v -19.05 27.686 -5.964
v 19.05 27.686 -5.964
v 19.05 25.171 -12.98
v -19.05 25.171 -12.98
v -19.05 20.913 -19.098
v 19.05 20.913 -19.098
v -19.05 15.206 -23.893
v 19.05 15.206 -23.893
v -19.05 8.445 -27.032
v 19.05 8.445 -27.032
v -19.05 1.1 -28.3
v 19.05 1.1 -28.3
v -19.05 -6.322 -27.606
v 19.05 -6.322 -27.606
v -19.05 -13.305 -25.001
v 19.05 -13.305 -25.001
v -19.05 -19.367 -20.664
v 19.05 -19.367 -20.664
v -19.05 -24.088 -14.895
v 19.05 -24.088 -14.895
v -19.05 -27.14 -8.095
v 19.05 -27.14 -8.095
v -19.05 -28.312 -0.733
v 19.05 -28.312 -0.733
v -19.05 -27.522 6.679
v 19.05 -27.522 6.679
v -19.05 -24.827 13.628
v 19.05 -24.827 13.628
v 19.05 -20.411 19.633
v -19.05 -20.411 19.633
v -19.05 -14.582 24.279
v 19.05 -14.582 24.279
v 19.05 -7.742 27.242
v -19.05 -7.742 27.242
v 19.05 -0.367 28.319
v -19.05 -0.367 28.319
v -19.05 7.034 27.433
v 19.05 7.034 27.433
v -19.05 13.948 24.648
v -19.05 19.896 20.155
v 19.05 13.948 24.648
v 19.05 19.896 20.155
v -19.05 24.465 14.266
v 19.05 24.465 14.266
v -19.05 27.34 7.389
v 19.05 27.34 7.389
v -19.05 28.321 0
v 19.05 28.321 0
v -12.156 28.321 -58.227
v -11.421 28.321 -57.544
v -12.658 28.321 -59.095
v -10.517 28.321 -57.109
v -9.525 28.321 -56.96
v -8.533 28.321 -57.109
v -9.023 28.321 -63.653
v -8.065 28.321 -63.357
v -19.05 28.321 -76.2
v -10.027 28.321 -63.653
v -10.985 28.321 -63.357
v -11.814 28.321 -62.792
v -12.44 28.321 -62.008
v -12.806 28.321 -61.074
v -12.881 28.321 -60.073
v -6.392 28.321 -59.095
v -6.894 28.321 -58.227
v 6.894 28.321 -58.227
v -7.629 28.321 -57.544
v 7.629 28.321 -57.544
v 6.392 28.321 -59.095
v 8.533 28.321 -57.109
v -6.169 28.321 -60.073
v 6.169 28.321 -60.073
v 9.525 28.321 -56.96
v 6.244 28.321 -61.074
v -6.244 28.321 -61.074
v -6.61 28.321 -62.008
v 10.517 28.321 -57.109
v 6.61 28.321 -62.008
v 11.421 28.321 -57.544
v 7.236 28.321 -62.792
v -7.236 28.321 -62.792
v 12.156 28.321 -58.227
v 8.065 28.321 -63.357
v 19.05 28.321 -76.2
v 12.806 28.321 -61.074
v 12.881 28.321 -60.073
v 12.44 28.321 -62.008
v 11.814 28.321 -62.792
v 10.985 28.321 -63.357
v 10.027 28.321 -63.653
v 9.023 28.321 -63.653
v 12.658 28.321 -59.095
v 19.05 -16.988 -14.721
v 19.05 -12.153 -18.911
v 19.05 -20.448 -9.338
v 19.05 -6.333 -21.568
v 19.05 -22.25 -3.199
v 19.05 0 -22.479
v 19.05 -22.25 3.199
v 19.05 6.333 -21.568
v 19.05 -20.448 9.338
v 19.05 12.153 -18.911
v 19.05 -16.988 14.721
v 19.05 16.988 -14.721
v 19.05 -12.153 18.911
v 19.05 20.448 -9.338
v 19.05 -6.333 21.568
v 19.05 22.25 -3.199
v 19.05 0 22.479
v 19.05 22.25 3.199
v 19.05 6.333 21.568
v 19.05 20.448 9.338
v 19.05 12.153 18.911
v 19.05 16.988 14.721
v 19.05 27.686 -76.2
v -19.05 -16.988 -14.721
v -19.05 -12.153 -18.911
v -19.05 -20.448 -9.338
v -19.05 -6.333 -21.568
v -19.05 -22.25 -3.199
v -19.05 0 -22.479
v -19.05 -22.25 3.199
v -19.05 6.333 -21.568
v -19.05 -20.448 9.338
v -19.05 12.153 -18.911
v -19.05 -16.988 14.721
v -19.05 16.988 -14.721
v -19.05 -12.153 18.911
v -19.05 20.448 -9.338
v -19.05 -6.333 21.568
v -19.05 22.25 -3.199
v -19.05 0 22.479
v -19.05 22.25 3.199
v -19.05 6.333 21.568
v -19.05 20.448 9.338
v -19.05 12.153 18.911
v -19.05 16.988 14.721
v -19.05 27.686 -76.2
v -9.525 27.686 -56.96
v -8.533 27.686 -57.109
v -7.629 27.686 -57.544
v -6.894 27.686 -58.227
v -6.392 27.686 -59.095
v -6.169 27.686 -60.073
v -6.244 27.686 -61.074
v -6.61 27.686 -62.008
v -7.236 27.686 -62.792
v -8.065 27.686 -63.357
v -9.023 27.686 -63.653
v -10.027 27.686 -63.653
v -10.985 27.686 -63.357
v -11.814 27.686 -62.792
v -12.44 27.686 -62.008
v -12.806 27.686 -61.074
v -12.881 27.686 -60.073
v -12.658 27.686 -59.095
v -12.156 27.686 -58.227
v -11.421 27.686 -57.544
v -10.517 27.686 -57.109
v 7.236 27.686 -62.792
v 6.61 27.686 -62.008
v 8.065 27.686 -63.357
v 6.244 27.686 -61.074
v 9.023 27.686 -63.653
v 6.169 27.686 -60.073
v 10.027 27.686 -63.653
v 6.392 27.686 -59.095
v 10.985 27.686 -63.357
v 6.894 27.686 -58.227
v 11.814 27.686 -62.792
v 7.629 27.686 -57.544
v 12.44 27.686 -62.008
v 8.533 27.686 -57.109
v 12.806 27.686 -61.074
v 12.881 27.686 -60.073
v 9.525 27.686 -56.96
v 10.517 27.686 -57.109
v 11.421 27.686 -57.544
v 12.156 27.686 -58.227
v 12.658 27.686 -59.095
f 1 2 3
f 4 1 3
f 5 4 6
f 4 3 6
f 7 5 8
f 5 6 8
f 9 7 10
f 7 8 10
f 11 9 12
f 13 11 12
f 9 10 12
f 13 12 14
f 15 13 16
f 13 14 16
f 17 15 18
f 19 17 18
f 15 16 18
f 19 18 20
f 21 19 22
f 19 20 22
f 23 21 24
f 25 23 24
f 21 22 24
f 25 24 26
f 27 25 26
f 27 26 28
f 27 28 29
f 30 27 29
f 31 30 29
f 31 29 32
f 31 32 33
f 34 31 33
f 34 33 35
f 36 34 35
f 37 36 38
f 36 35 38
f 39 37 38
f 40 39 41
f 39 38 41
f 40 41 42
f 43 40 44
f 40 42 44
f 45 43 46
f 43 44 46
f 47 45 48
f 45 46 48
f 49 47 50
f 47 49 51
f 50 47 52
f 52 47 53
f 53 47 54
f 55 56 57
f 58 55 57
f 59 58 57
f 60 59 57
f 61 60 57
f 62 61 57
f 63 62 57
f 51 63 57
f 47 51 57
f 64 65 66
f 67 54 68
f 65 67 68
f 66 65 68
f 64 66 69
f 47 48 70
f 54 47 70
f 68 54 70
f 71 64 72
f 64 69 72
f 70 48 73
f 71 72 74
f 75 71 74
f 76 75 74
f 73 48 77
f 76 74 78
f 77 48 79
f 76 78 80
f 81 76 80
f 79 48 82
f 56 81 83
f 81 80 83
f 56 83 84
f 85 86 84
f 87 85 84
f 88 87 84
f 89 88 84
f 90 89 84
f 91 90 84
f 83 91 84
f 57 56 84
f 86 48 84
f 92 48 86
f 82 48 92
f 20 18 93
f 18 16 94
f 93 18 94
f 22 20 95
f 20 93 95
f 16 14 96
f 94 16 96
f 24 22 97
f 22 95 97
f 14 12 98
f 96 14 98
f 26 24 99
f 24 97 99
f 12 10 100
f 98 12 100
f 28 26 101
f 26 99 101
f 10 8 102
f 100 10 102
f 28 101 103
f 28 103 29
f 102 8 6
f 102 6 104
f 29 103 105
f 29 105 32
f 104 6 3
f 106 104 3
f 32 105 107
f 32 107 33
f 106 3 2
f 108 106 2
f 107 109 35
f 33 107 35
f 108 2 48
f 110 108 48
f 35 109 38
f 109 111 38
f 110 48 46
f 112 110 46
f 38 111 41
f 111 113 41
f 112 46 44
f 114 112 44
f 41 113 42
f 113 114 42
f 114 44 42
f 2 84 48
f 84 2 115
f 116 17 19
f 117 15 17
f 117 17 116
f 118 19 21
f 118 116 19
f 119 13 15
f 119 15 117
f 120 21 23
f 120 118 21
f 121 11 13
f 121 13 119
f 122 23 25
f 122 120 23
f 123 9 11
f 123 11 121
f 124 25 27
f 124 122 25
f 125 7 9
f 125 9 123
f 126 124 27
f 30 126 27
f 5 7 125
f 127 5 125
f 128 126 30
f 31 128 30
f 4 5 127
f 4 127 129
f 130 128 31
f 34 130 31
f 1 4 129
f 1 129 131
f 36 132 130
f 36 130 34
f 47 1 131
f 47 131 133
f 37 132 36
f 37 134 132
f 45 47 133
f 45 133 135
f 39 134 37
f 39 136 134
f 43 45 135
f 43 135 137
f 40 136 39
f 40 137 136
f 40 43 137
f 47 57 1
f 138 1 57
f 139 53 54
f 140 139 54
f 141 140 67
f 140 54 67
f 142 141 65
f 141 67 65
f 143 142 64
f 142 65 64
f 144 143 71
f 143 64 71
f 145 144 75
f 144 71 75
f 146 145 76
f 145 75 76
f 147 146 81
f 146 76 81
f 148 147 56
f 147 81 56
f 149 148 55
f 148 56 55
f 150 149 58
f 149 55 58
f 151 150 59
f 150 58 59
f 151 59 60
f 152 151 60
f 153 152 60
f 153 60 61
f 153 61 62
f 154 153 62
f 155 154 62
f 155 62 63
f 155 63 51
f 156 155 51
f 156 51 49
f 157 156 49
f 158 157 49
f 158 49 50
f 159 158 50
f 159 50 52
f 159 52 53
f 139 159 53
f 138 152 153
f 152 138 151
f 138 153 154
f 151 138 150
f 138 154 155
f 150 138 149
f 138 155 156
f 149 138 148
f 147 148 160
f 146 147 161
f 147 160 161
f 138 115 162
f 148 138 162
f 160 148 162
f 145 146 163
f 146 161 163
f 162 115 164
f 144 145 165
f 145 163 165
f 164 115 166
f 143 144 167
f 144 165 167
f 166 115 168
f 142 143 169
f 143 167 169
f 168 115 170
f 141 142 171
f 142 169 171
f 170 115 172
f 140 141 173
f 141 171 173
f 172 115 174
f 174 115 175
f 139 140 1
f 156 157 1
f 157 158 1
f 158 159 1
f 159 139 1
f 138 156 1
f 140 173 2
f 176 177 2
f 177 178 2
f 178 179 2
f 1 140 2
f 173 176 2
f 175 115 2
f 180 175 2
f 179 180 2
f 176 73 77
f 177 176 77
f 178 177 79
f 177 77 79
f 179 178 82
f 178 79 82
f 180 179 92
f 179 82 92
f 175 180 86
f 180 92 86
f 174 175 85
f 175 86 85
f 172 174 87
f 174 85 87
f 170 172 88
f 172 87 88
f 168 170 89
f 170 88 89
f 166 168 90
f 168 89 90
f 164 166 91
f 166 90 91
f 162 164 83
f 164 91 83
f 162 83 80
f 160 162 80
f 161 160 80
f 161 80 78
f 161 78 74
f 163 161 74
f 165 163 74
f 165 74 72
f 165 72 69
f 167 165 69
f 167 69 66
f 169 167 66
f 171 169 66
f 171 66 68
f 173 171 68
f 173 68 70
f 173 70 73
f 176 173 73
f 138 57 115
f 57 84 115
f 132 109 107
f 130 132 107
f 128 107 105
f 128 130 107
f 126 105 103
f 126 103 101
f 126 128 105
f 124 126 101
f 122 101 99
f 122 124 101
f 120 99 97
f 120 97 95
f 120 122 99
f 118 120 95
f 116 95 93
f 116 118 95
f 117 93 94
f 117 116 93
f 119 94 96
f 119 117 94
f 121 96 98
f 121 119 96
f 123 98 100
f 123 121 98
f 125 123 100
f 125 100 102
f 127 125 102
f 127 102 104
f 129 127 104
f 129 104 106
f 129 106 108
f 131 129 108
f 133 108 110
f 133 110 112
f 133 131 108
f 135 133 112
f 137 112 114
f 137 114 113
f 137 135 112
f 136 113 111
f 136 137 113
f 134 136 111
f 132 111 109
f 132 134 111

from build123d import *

# Parameters (mm, degrees)
SKETCH1_R           = 22.479
BOSS_EXTRUDE1_DEPTH = 19.05
TWOHOLE_REACH       = 98.838
SKETCH4_R           = 3.3655


with BuildPart() as part:
    # Sketch1 → Boss-Extrude1 (new, symmetric)
    with BuildSketch(Plane(origin=(0, 0, 0), x_dir=(0, 0, -1), z_dir=(1, 0, 0))):
        with BuildLine():
            Line((0, 28.321), (76.2, 28.321))
            Line((76.2, 28.321), (76.2, 27.686))
            Line((76.2, 27.686), (5.963593296, 27.686))
            ThreePointArc((5.963593296, 27.686), (-2.998652614, -28.161802561), (0, 28.321))
        make_face()
        with Locations(Location((0, 0, 0), (0, 0, 180))):
            Circle(SKETCH1_R, mode=Mode.SUBTRACT)
    extrude(amount=BOSS_EXTRUDE1_DEPTH, both=True)

    # Sketch4 → TwoHole (cut, up to next)
    with BuildSketch(Plane(origin=(0, 28.321, 0), x_dir=(1, 0, 0), z_dir=(0, 1, 0)), mode=Mode.PRIVATE) as twohole_sk1:
        with Locations(Location((-9.525, 60.325, 0), (0, 0, 270))):
            Circle(SKETCH4_R)
    twohole_tool1 = extrude(twohole_sk1.sketch, amount=-TWOHOLE_REACH, mode=Mode.PRIVATE) & part.part
    # Sketch4 → TwoHole (cut, up to next)
    with BuildSketch(Plane(origin=(0, 28.321, 0), x_dir=(1, 0, 0), z_dir=(0, 1, 0)), mode=Mode.PRIVATE) as twohole_sk2:
        with Locations(Location((9.525, 60.325, 0), (0, 0, 270))):
            Circle(SKETCH4_R)
    twohole_tool2 = extrude(twohole_sk2.sketch, amount=-TWOHOLE_REACH, mode=Mode.PRIVATE) & part.part
    add(twohole_tool1.solids().sort_by_distance((-9.525, 28.321, -60.325))[0], mode=Mode.SUBTRACT)
    add(twohole_tool2.solids().sort_by_distance((9.525, 28.321, -60.325))[0], mode=Mode.SUBTRACT)


solid = part.part
